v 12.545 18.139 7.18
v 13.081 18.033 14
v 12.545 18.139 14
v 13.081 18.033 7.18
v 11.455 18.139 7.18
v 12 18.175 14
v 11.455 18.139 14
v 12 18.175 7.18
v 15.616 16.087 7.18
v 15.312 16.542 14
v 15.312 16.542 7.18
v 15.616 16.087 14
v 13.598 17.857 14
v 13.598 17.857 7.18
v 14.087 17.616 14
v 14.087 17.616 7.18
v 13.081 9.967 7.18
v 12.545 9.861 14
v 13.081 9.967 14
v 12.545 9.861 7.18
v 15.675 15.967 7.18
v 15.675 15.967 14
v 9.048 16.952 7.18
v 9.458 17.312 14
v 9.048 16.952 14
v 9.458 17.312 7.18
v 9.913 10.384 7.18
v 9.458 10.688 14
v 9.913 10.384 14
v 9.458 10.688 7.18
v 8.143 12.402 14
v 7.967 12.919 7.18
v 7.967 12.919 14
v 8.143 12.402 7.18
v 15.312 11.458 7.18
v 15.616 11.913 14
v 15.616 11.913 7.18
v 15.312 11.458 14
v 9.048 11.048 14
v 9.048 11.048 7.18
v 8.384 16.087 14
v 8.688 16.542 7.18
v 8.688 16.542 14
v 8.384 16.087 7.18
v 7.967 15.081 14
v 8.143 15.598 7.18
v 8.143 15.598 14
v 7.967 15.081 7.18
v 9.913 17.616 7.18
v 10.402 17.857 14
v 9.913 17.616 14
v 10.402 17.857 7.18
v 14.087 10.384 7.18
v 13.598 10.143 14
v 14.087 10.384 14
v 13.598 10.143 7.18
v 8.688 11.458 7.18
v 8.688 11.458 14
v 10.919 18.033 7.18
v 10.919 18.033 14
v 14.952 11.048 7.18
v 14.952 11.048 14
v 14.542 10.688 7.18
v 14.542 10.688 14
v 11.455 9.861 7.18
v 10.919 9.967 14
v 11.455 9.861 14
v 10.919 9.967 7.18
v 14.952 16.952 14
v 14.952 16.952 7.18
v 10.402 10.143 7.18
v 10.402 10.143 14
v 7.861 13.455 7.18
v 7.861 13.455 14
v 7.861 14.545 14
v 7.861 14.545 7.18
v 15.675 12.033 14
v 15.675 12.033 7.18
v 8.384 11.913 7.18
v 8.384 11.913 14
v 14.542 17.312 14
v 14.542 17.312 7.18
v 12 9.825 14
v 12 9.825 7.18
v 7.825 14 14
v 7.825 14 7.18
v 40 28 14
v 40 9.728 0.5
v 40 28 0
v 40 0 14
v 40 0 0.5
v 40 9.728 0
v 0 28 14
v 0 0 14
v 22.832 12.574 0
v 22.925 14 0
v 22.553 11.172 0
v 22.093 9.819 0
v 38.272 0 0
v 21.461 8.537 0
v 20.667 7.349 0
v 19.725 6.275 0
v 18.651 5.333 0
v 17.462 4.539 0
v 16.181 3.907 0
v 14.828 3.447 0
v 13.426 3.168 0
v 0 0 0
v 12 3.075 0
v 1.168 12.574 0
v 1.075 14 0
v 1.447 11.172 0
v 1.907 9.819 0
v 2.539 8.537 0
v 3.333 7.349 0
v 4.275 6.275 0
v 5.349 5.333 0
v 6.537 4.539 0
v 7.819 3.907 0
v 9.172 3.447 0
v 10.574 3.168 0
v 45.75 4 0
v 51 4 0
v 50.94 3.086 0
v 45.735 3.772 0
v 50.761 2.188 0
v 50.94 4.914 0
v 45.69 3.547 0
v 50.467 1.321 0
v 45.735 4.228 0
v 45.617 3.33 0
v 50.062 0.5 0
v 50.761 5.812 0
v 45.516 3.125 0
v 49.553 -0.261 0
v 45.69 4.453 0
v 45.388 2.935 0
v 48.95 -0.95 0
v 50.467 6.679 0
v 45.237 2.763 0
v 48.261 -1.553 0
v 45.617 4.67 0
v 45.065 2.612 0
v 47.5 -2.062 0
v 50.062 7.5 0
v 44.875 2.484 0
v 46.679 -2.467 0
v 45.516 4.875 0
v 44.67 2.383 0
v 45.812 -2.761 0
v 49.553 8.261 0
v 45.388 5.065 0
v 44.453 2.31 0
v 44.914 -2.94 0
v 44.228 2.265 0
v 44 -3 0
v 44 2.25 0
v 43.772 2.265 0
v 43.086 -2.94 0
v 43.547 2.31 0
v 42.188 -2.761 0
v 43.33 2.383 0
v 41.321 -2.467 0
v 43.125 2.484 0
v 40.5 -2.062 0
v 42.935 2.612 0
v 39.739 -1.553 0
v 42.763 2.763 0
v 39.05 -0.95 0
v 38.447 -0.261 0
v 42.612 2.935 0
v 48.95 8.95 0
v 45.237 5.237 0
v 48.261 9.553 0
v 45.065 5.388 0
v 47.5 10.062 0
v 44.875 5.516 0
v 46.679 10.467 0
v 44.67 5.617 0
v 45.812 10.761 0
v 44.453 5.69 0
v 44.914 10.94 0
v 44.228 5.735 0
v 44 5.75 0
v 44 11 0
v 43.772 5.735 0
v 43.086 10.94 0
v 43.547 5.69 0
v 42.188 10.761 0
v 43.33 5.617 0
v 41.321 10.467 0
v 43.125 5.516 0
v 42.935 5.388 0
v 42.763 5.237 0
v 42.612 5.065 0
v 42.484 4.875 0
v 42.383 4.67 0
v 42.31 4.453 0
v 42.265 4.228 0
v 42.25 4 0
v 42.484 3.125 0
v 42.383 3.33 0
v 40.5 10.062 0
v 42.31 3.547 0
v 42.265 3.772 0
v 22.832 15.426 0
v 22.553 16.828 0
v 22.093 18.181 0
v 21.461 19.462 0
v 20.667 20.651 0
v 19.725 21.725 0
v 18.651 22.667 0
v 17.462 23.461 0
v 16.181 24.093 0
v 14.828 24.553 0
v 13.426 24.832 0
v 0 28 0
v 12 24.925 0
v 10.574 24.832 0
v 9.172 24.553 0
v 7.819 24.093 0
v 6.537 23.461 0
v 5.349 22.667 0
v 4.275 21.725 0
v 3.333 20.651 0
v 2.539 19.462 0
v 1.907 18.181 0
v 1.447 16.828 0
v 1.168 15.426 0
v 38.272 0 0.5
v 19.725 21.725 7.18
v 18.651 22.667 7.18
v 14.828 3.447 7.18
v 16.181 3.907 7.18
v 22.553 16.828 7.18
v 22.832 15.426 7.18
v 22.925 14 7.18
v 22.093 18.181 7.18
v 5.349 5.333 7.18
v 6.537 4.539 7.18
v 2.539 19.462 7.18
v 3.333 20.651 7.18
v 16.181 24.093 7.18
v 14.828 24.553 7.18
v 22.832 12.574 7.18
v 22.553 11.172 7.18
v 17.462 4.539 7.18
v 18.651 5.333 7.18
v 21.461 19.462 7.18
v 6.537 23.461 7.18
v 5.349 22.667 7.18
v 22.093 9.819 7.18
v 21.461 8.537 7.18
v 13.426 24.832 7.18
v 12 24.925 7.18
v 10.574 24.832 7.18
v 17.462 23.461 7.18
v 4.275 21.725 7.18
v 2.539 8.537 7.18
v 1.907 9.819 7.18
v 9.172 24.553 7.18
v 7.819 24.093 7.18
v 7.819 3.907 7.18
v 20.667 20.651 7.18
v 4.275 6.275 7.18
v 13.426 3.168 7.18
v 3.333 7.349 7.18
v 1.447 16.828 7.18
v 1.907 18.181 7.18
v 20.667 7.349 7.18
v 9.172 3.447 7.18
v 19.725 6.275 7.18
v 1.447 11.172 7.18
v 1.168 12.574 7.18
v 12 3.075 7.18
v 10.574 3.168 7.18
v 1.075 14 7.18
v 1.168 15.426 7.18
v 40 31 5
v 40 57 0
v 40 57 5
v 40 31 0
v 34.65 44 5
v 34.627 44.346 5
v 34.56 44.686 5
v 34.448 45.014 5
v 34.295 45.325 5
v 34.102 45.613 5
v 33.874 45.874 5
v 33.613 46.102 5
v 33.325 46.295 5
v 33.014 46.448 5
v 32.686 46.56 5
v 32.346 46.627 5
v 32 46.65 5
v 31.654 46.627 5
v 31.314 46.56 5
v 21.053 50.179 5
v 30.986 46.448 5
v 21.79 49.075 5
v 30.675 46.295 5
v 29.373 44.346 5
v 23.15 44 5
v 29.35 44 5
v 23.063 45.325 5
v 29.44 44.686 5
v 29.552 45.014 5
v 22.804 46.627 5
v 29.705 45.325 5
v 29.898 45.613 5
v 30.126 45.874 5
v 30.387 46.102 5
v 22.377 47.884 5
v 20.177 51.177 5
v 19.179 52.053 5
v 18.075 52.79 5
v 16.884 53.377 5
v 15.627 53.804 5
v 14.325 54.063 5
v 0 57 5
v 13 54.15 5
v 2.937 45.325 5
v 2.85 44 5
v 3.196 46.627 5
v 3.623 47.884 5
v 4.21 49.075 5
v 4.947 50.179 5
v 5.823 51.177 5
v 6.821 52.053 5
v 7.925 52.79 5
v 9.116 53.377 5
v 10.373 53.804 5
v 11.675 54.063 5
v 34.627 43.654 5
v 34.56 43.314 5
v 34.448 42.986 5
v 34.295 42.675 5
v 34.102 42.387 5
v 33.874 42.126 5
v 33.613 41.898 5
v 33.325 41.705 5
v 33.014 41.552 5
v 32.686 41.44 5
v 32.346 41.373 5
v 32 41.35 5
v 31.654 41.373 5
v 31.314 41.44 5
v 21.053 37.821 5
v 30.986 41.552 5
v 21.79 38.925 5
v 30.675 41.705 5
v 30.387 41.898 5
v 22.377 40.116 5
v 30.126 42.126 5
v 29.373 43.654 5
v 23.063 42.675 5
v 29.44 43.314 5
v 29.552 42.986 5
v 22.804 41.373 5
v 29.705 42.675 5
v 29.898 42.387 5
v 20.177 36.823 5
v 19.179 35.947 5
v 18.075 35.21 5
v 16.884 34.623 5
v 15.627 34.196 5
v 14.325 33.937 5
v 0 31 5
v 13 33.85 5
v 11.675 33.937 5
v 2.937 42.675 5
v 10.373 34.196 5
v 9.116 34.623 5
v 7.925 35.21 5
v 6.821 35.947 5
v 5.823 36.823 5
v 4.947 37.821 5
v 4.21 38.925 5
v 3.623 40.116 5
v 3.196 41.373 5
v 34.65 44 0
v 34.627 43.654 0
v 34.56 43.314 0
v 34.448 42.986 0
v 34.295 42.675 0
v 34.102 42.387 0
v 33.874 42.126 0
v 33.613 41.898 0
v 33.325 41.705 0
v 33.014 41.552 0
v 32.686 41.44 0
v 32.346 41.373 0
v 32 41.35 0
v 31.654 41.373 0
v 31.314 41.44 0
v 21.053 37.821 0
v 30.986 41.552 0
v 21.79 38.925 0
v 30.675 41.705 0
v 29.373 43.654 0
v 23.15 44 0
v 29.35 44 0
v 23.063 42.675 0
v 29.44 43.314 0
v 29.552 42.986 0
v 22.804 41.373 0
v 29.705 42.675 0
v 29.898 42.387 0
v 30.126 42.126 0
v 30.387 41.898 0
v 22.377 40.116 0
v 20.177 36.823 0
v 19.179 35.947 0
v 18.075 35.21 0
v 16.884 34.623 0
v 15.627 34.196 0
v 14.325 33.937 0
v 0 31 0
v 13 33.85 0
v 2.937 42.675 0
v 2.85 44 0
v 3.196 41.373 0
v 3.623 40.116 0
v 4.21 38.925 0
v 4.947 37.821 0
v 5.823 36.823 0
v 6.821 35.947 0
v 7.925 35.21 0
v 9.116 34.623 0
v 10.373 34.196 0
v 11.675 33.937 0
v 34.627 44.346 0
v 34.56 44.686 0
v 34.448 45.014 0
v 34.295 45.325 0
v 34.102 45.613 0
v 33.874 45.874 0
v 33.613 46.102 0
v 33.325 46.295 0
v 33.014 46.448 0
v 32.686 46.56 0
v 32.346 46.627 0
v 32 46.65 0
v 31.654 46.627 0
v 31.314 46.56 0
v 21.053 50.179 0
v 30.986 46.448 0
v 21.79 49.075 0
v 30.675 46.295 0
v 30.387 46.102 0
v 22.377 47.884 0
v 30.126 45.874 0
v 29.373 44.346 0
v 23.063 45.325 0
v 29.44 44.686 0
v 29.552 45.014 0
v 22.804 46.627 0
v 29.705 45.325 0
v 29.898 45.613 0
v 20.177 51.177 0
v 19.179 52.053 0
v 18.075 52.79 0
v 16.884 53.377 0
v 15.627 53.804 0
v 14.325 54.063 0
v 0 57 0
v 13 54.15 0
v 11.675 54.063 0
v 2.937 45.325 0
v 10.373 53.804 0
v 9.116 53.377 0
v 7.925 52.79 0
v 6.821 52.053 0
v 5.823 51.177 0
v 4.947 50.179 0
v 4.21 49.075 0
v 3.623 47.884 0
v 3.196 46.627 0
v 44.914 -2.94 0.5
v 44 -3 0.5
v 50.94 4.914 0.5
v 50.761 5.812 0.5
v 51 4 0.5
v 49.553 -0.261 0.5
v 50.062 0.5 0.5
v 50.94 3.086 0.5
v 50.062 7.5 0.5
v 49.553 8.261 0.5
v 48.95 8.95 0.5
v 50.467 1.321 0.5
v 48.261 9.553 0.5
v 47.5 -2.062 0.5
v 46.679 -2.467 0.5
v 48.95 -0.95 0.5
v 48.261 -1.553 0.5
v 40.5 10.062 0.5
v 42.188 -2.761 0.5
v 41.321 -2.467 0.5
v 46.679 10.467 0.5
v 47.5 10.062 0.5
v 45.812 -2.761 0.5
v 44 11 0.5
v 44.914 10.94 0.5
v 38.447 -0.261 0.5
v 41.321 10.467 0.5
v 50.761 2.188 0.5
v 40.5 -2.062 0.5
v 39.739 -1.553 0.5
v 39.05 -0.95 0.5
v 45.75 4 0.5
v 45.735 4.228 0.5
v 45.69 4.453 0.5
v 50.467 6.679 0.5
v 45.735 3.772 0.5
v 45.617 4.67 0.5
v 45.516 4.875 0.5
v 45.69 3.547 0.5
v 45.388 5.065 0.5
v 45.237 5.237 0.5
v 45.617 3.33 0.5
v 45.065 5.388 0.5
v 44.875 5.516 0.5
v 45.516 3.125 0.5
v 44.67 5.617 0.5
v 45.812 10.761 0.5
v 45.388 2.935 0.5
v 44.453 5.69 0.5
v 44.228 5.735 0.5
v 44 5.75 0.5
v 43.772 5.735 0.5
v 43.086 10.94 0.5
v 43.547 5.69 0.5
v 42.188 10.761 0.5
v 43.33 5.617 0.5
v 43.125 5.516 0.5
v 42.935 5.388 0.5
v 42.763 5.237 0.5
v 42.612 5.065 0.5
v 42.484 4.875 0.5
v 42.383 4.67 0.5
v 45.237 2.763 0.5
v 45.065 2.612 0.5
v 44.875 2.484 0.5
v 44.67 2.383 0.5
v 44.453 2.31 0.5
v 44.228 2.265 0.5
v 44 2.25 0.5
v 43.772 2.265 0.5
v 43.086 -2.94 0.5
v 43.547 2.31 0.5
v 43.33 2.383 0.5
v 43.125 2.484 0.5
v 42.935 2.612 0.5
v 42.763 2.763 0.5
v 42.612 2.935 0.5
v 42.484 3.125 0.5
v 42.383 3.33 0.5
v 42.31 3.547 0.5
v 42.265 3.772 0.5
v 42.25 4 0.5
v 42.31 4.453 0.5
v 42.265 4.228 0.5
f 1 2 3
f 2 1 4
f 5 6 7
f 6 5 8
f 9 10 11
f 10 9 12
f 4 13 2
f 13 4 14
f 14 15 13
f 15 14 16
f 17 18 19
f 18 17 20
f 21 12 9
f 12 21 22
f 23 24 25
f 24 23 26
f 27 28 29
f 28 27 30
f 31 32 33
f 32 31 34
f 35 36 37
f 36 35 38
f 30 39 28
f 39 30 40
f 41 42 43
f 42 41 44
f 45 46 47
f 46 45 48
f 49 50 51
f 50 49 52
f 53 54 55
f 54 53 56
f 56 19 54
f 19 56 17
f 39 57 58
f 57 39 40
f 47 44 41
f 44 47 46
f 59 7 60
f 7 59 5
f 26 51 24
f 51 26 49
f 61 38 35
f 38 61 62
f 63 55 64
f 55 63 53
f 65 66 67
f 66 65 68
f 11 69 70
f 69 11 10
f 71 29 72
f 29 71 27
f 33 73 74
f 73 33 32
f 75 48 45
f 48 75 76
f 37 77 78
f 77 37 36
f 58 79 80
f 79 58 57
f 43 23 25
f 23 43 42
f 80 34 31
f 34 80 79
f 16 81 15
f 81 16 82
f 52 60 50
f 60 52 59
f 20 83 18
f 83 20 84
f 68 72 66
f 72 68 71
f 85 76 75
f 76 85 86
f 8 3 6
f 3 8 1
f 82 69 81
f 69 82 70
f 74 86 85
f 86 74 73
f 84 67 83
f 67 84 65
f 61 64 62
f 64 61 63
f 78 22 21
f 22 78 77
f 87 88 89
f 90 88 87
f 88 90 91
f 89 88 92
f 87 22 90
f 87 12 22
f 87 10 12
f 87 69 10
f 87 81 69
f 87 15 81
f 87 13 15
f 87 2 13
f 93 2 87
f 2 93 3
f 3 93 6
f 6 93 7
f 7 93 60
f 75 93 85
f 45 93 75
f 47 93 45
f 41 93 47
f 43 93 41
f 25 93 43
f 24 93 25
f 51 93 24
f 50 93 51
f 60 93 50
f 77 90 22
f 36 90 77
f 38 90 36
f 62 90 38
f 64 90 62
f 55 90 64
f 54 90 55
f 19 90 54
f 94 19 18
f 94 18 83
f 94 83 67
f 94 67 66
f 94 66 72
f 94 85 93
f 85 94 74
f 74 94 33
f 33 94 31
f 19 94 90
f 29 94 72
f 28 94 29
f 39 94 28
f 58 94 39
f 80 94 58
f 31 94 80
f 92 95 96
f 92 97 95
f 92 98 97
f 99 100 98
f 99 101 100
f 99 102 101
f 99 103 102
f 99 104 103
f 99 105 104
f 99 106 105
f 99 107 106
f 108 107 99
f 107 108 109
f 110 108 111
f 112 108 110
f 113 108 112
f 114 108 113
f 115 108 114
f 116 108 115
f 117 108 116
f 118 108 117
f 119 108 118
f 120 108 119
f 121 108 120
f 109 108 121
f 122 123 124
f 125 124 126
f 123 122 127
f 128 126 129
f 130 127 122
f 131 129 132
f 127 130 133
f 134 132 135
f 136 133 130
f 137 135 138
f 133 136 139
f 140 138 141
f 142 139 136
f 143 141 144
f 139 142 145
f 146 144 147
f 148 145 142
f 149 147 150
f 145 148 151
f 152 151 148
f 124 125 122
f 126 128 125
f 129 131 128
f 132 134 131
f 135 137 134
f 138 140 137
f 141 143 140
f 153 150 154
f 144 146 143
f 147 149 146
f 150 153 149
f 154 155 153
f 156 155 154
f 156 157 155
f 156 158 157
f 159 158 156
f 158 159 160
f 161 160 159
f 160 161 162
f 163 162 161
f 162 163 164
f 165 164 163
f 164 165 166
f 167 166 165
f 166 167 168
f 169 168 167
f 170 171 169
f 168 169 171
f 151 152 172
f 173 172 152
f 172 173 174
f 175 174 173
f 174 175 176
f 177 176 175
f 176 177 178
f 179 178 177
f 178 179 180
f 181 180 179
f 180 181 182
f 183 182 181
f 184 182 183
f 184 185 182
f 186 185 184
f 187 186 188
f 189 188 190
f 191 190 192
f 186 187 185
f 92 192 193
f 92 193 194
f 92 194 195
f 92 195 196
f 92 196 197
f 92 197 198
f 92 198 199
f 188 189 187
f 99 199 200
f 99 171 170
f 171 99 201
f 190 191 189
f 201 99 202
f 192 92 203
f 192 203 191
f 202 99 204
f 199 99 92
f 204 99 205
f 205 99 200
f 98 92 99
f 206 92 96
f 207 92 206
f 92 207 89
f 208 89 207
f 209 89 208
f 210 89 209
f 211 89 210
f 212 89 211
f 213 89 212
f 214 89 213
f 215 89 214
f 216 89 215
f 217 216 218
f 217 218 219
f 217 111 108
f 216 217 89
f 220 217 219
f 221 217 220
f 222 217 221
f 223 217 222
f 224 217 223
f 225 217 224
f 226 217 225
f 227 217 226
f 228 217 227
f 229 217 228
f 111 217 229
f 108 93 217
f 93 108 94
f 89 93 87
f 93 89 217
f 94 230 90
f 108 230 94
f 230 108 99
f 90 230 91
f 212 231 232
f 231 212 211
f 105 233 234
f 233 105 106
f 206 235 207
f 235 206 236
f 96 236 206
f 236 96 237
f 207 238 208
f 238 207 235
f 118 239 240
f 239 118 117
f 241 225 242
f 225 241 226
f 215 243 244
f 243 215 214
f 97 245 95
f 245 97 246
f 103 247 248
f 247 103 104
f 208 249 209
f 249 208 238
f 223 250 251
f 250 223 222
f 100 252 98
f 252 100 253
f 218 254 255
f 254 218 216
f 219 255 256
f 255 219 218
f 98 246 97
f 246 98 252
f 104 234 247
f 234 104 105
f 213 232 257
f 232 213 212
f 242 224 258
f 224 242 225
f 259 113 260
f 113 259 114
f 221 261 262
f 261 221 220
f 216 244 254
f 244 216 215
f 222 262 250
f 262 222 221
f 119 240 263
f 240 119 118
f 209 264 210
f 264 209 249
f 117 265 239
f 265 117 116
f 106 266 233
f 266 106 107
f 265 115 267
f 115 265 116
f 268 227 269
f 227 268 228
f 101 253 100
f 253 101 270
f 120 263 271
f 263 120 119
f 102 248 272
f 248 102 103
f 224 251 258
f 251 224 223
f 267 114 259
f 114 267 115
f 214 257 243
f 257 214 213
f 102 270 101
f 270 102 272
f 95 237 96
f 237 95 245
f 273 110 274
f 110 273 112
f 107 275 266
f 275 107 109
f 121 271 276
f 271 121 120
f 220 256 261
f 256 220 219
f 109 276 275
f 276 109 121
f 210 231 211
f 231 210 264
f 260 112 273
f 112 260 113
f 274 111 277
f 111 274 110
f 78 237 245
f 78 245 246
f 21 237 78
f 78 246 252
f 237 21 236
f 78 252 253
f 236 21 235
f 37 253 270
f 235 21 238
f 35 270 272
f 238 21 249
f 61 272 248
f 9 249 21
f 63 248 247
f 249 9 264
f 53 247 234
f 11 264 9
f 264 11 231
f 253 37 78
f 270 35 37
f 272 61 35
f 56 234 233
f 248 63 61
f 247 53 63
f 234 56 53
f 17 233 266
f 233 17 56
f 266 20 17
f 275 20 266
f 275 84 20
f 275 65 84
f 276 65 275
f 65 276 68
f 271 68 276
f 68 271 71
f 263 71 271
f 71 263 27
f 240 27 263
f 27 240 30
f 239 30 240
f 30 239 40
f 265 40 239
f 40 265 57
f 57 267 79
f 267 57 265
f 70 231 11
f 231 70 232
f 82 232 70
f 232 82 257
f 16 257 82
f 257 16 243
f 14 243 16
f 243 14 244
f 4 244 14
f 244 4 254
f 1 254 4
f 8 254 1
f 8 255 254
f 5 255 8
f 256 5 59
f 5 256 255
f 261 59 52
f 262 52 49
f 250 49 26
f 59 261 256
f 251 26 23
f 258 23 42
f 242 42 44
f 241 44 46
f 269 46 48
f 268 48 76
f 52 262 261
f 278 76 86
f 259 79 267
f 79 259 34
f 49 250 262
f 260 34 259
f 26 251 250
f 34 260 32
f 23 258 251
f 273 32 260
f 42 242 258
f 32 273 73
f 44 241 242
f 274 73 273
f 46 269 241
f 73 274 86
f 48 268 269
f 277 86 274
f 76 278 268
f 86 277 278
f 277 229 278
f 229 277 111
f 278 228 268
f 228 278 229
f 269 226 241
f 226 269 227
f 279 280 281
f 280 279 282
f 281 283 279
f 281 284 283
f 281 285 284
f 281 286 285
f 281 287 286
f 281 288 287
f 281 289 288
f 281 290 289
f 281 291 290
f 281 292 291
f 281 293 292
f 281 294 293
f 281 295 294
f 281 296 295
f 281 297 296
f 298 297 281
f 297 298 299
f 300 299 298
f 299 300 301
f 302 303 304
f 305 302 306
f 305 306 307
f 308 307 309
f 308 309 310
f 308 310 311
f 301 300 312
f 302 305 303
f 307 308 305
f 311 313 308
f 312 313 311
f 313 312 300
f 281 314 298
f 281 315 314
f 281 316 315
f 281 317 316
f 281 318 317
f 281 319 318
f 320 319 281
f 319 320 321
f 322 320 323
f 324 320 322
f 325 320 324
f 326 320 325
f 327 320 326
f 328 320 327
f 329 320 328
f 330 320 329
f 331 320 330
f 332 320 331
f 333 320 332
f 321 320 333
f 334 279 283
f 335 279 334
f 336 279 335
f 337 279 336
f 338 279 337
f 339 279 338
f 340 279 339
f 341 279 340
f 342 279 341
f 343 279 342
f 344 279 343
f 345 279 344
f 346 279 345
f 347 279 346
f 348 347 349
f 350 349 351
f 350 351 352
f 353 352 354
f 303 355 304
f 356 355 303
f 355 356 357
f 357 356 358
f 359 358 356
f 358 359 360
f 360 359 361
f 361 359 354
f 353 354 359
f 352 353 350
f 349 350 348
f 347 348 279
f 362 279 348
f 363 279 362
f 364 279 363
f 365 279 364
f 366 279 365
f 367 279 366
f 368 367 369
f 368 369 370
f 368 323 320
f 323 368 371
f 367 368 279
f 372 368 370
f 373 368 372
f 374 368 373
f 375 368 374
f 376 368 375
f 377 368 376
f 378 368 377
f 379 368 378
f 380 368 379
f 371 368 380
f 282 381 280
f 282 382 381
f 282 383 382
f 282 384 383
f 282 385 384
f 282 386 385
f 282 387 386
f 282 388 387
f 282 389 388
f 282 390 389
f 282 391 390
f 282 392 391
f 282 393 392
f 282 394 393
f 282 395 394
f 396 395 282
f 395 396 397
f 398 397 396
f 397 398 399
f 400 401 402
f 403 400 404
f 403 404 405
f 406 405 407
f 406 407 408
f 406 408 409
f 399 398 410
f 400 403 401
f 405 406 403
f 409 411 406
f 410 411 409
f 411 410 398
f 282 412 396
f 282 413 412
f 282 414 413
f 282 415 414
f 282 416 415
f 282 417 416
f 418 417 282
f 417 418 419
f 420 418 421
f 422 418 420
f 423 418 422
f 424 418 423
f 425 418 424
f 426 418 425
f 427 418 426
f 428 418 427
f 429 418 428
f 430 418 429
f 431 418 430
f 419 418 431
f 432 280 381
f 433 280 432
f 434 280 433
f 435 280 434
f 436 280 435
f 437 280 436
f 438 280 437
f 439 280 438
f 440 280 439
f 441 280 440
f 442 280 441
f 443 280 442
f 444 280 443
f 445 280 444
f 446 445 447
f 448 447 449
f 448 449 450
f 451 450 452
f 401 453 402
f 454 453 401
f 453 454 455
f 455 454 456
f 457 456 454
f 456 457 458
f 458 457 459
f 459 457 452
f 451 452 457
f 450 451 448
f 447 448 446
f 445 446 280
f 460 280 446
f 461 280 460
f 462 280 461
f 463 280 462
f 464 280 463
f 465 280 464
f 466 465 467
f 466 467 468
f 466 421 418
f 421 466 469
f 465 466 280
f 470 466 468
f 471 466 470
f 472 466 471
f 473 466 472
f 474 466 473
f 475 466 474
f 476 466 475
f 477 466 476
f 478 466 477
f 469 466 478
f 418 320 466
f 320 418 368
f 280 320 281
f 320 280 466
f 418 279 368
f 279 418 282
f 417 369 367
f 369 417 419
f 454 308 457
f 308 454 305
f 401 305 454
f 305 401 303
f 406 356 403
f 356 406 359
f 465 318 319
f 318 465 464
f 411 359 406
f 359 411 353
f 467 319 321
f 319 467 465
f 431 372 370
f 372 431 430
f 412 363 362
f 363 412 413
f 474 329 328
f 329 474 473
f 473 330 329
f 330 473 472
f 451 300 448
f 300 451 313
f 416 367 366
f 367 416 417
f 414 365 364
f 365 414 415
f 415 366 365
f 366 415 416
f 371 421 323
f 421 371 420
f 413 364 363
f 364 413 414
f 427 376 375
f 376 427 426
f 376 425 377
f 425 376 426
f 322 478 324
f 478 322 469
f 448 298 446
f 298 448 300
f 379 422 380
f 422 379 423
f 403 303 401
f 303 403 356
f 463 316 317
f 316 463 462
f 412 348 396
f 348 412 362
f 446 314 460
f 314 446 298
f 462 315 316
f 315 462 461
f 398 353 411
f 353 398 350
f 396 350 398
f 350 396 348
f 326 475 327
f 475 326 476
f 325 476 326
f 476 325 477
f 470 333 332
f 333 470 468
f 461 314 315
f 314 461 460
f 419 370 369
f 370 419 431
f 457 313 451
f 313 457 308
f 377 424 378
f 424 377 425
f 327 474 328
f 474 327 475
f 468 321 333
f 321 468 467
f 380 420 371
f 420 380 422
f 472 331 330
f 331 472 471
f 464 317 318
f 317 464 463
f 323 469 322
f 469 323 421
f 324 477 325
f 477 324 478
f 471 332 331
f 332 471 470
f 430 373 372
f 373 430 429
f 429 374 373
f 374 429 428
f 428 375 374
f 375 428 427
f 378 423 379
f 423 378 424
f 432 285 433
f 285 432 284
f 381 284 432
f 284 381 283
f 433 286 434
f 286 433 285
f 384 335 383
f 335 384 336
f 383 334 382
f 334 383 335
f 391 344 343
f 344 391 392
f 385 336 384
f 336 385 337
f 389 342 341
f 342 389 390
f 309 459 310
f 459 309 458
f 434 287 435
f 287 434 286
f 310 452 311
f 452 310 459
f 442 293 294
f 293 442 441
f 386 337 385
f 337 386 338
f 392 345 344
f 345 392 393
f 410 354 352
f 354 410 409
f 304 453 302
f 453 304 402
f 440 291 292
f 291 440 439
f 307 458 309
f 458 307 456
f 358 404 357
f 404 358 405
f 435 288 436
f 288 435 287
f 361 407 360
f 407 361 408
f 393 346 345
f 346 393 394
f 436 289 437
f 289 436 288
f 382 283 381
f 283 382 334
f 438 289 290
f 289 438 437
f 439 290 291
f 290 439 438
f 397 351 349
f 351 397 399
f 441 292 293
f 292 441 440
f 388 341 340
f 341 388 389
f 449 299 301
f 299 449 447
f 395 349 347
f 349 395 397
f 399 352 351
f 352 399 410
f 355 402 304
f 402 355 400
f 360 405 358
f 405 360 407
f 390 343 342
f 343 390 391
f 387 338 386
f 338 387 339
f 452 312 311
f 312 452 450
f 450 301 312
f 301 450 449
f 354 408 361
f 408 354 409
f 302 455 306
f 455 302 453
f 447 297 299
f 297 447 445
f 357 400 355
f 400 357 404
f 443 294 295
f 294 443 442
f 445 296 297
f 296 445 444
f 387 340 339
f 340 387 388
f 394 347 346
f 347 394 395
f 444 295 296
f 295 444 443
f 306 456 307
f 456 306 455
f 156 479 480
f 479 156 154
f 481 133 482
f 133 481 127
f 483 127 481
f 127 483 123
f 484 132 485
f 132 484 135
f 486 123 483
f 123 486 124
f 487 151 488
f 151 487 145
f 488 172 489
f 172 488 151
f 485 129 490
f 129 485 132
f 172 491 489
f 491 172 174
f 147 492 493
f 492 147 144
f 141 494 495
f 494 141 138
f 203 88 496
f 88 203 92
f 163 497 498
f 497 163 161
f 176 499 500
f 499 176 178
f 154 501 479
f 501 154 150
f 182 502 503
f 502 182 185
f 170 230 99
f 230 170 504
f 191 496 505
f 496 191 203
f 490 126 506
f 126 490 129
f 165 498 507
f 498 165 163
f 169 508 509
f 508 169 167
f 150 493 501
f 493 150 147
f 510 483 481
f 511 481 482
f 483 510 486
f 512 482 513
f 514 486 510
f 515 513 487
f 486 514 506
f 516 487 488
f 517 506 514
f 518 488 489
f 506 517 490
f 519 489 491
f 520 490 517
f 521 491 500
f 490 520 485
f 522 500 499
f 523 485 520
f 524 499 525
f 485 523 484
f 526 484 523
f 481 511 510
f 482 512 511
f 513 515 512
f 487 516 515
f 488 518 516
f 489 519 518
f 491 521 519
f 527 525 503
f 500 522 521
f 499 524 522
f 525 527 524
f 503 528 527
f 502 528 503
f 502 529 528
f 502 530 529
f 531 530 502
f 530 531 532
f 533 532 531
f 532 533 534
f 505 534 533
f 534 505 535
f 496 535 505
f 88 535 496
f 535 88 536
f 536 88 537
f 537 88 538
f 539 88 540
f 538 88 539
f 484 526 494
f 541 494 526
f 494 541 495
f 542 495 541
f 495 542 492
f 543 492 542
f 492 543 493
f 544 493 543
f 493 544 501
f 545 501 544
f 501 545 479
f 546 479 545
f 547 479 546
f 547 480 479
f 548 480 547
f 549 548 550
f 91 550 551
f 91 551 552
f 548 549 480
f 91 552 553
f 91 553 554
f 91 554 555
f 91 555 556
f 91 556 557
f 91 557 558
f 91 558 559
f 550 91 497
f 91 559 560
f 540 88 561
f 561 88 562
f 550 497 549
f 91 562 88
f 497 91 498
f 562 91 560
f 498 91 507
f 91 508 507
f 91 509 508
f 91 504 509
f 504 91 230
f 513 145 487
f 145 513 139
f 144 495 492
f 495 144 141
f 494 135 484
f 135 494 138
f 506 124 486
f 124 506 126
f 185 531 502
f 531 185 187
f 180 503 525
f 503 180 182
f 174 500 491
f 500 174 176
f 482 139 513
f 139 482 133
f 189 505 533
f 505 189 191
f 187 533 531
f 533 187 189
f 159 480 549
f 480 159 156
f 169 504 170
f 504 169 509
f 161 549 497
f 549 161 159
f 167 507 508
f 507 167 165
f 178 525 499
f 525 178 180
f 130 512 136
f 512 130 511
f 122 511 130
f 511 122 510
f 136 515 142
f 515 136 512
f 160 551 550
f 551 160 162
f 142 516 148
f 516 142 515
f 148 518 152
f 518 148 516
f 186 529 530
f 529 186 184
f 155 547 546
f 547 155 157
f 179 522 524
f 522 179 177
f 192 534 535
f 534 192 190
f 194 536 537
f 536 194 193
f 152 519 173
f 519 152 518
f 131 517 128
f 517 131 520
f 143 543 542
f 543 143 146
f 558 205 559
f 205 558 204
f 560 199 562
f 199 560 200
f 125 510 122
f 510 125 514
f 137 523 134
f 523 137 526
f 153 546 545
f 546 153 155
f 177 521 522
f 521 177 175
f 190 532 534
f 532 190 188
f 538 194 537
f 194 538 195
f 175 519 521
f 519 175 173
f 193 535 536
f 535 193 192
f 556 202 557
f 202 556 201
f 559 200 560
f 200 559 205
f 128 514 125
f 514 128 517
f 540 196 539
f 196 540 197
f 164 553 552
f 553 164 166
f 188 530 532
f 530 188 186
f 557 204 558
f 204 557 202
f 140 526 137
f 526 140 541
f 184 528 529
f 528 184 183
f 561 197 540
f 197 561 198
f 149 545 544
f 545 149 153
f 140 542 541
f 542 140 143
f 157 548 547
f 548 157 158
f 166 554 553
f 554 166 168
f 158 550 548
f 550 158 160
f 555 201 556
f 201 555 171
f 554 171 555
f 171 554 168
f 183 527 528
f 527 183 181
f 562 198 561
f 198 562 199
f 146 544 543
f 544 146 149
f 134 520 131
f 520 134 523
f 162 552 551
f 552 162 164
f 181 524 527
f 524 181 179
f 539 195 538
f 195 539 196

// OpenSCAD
// file: parameters.scad
// =============================================================================
// Gen-BV — nightly 2026-10-10 (physics_scorer, honest magpylib watts)
// Fewer, wider-spaced poles: 6 Ø20 per rotor (12 of the 16) on an R57 ring over nine 35.2° bobbins (r 39–74 mm, 15.7 mm build). Wider pole pitch means less pole-to-pole leakage and bigger coils, but the electrical frequency drops 25 % and 4 Ø20 sit idle; diametric Ø5 assists lowered the score here, so none are fitted. The scorer puts it at about 62 % of Gen-BR.
// Clocking 0 deg (magnets N facing S) + D-flat keyed bore + index notch + flip-symmetric hole map.
// Windable 2-piece bobbin; turns = physics_scorer turns_fit; copper only between flanges.
// Steel back-iron: 2× Ø142 × 4.76 mm (3/16") mild-steel discs (steel_backiron_disc.dxf); magnets sit ON the steel
// (through-pockets) -> score with --back-iron. Night 2026-10-10.
// =============================================================================
topology            = "dual_rotor";

// --- Wire / winding (physics_scorer winding-fit) -------------------------------
wire_awg            = 26;
wire_od             = 0.45;     // insulated OD mm (bare 0.405)
fill_realistic      = 0.65;     // insulated-wire area / window (DENSE layered wind with a jig; scorer cap 0.65)
turns               = 518;       // = physics_scorer turns_fit (do NOT raise)
coil_former_type    = "bobbin";
coil_core_inset     = 15.66;     // radial copper build: hub = copper boundary inset by this
wind_build_axial    = 0.0;      // nothing proud of the flanges
wind_build_radial   = 0.0;

// --- Bobbin (base + lid) ---------------------------------------------------------
coil_id_r           = 39.00;    // copper boundary sector
coil_od_r           = 74.00;
span_deg            = 35.15;    // = pitch - 2*asin((wall+0.85)/coil_id_r) -> >=1.2 mm stator web
former_web          = 8.10;     // copper height between flanges (TALL copper: steel keeps Bz up)
flange_t            = 0.80;     // >= 0.8 mm FDM wall rule (tall winds push on the flanges)
wall                = 0.80;     // flange lip beyond copper
former_bare_h       = former_web + 2 * flange_t;
coil_envelope_h     = former_bare_h + 2 * wind_build_axial;
tab_w               = 7.0;
tab_len             = 7.0;
tab_h               = former_bare_h / 2;
pin_d               = 1.9;      // 1.75 mm filament locating pin
coil_mount_r        = coil_od_r + 0.2 + 4.0;
lead_y              = 1.6;
lead_slot_w         = 0.9;
lead_groove_d       = 0.6;

// --- Gap -------------------------------------------------------------------------
run_clear           = 0.50;     // rotor face -> flange
gap_spacer_h        = run_clear + wind_build_axial;
m2m                 = coil_envelope_h + 2 * run_clear;   // rotor face to rotor face (= gap_sleeve length)

// --- Stator ----------------------------------------------------------------------
coil_stations       = 9;
bay_clear           = 0.25;
stator_thick        = former_bare_h;                        // bobbins flush both faces
stator_od           = 166;
shaft_clear_stator  = 14.0;     // stator is static; gap sleeve OD 12 spins inside

// --- Rotor(s) --------------------------------------------------------------------
magnet_Br           = 1.43;     // N52
magnet_d_large      = 20.0;
magnet_h_large      = 5.0;      // one O20x5 per pocket
magnet_h_small      = 5.0;      // unused: no O5 pockets in this kit
halbach_magnetisation = "none";  // NO O5 assist magnets in this kit (scan: they lower the 4-pole score)
rotor_b_same_axis   = true;     // same-index magnets share one axis: N faces S across the gap
large_pocket_d      = 20.3;
small_pocket_d      = 5.3;
pocket_h            = 5.00;     // THROUGH the carrier: magnet back face sits on the steel disc (FLUSH seat: carrier = magnet height, magnet face level with the rotor face)
large_n             = 6;
R_large             = 57.0;
small_r_list        = [];       // no O5 pockets
carrier_od          = 142.0;
carrier_thick       = pocket_h;
hub_h               = 12.0;     // > steel_t + insert: radial set-screw clears the steel
hub_od              = 24.0;     // slim hub so the M4 brace rods fit at R~18 inside the coil ring
hub_insert_d        = 4.0;      // M3 heat-set insert, radial, bears on the D-flat
rotor_b_offset_deg  = 0.0;      // CLOCKING: magnets directly opposite
shaft_key           = "dflat";
dflat_depth         = 0.5;      // 8 mm shaft with 0.5 mm flat (7.5 across flat)
index_notch_d       = 3.0;

// --- Steel back-iron (buyable laser-cut) -------------------------------------------
steel_t             = 4.76;      // mild steel thickness (image method ignores it; sized from steel_flux.py so the return path stays well below saturation)
steel_center_hole   = 26.0;     // slips over the rotor hub (OD 24)
steel_od            = carrier_od;   // steel disc OD = rotor carrier OD

// --- Modular MAX interface ----------------------------------------------------------
shaft_bore          = 8.35;
dflat_x             = 4.0 - dflat_depth + (shaft_bore - 8.0) / 2;
bearing_d           = 21.85;
bearing_h           = 7.2;
m3_clear            = 3.5;
bolt_r_inner        = 30.0;     // M3 steel-disc clamp bolts (inside the magnet ring)
bolt_n_inner        = 4;
bolt_inner_angles   = [0, 90, 180, 270];
bolt_r_outer        = 66.0;     // second M3 steel-disc clamp ring
bolt_outer_angles   = [15, 165, 195, 345];
flange_bolt_r       = 77.0;     // frame rods: OUTSIDE the rotor OD (rotors spin inside them)
flange_bolt_n       = 9;
flange_bolt_offset  = 20.00;    // between coil stations -> never cuts a lead groove/tab
brace_r             = 18.0;
brace_d             = 4.3;      // temporary M4 jack rods (assembly only)
brace_n             = 4;
brace_angles        = [45, 135, 225, 315];          // flip-symmetric

spacer_pad_od       = 14.0;
spacer_pad_id       = m3_clear;
endbell_od          = 164.0;
endbell_thick       = 8.0;
endbell_shaft_clear = 10.0;
collar_h            = 10.0;
standoff_od         = 9.0;
frame_standoff_h    = run_clear + carrier_thick + hub_h + collar_h + 2.0;
sleeve_od           = 12.0;
plate_max_mm        = 410;

$fn = 64;
// main file
// Gen-BV — fit coupon: O20/O5 THROUGH pockets at carrier thickness (test on a steel offcut), 608 seat,
// D-flat bore, gap shim, and one bobbin-bay slice (bobbin footprint + bay_clear) to test former fit.
include <parameters.scad>;
$fn = 48;
// D-flat keyed bore: flat faces +X (angle 0 = magnet pocket 0 = index notch)
module dflat_bore(h) {
    intersection() {
        cylinder(d=shaft_bore, h=h);
        translate([-shaft_bore, -shaft_bore, 0]) cube([shaft_bore + dflat_x, 2*shaft_bore, h]);
    }
}
module sector_2d(r_in, r_out, ang) {
    polygon([
        for (a = [-ang/2 : ang/24 : ang/2]) [r_in*cos(a), r_in*sin(a)],
        for (a = [ang/2 : -ang/24 : -ang/2]) [r_out*cos(a), r_out*sin(a)]
    ]);
}
module footprint_2d() { offset(r=wall) sector_2d(coil_id_r, coil_od_r, span_deg); }
module hub_2d()       { offset(delta=-coil_core_inset) sector_2d(coil_id_r, coil_od_r, span_deg); }

block_w = 40; block_d = 28; block_h = 14;
difference() {
    cube([block_w, block_d, block_h]);
    translate([12, block_d/2, -0.02]) cylinder(d=bearing_d, h=bearing_h);
    translate([12, block_d/2, -0.1]) dflat_bore(block_h + 1);
}
translate([0, block_d + 3, 0]) difference() {
    cube([40, 26, carrier_thick]);
    translate([13, 13, -0.1]) cylinder(d=large_pocket_d, h=carrier_thick + 0.2);
    translate([32, 13, -0.1]) cylinder(d=small_pocket_d, h=carrier_thick + 0.2);
}
translate([block_w + 4, 4, 0])
    difference() {
        cylinder(d=spacer_pad_od, h=gap_spacer_h);
        translate([0, 0, -0.1]) cylinder(d=spacer_pad_id, h=gap_spacer_h + 0.2);
    }
